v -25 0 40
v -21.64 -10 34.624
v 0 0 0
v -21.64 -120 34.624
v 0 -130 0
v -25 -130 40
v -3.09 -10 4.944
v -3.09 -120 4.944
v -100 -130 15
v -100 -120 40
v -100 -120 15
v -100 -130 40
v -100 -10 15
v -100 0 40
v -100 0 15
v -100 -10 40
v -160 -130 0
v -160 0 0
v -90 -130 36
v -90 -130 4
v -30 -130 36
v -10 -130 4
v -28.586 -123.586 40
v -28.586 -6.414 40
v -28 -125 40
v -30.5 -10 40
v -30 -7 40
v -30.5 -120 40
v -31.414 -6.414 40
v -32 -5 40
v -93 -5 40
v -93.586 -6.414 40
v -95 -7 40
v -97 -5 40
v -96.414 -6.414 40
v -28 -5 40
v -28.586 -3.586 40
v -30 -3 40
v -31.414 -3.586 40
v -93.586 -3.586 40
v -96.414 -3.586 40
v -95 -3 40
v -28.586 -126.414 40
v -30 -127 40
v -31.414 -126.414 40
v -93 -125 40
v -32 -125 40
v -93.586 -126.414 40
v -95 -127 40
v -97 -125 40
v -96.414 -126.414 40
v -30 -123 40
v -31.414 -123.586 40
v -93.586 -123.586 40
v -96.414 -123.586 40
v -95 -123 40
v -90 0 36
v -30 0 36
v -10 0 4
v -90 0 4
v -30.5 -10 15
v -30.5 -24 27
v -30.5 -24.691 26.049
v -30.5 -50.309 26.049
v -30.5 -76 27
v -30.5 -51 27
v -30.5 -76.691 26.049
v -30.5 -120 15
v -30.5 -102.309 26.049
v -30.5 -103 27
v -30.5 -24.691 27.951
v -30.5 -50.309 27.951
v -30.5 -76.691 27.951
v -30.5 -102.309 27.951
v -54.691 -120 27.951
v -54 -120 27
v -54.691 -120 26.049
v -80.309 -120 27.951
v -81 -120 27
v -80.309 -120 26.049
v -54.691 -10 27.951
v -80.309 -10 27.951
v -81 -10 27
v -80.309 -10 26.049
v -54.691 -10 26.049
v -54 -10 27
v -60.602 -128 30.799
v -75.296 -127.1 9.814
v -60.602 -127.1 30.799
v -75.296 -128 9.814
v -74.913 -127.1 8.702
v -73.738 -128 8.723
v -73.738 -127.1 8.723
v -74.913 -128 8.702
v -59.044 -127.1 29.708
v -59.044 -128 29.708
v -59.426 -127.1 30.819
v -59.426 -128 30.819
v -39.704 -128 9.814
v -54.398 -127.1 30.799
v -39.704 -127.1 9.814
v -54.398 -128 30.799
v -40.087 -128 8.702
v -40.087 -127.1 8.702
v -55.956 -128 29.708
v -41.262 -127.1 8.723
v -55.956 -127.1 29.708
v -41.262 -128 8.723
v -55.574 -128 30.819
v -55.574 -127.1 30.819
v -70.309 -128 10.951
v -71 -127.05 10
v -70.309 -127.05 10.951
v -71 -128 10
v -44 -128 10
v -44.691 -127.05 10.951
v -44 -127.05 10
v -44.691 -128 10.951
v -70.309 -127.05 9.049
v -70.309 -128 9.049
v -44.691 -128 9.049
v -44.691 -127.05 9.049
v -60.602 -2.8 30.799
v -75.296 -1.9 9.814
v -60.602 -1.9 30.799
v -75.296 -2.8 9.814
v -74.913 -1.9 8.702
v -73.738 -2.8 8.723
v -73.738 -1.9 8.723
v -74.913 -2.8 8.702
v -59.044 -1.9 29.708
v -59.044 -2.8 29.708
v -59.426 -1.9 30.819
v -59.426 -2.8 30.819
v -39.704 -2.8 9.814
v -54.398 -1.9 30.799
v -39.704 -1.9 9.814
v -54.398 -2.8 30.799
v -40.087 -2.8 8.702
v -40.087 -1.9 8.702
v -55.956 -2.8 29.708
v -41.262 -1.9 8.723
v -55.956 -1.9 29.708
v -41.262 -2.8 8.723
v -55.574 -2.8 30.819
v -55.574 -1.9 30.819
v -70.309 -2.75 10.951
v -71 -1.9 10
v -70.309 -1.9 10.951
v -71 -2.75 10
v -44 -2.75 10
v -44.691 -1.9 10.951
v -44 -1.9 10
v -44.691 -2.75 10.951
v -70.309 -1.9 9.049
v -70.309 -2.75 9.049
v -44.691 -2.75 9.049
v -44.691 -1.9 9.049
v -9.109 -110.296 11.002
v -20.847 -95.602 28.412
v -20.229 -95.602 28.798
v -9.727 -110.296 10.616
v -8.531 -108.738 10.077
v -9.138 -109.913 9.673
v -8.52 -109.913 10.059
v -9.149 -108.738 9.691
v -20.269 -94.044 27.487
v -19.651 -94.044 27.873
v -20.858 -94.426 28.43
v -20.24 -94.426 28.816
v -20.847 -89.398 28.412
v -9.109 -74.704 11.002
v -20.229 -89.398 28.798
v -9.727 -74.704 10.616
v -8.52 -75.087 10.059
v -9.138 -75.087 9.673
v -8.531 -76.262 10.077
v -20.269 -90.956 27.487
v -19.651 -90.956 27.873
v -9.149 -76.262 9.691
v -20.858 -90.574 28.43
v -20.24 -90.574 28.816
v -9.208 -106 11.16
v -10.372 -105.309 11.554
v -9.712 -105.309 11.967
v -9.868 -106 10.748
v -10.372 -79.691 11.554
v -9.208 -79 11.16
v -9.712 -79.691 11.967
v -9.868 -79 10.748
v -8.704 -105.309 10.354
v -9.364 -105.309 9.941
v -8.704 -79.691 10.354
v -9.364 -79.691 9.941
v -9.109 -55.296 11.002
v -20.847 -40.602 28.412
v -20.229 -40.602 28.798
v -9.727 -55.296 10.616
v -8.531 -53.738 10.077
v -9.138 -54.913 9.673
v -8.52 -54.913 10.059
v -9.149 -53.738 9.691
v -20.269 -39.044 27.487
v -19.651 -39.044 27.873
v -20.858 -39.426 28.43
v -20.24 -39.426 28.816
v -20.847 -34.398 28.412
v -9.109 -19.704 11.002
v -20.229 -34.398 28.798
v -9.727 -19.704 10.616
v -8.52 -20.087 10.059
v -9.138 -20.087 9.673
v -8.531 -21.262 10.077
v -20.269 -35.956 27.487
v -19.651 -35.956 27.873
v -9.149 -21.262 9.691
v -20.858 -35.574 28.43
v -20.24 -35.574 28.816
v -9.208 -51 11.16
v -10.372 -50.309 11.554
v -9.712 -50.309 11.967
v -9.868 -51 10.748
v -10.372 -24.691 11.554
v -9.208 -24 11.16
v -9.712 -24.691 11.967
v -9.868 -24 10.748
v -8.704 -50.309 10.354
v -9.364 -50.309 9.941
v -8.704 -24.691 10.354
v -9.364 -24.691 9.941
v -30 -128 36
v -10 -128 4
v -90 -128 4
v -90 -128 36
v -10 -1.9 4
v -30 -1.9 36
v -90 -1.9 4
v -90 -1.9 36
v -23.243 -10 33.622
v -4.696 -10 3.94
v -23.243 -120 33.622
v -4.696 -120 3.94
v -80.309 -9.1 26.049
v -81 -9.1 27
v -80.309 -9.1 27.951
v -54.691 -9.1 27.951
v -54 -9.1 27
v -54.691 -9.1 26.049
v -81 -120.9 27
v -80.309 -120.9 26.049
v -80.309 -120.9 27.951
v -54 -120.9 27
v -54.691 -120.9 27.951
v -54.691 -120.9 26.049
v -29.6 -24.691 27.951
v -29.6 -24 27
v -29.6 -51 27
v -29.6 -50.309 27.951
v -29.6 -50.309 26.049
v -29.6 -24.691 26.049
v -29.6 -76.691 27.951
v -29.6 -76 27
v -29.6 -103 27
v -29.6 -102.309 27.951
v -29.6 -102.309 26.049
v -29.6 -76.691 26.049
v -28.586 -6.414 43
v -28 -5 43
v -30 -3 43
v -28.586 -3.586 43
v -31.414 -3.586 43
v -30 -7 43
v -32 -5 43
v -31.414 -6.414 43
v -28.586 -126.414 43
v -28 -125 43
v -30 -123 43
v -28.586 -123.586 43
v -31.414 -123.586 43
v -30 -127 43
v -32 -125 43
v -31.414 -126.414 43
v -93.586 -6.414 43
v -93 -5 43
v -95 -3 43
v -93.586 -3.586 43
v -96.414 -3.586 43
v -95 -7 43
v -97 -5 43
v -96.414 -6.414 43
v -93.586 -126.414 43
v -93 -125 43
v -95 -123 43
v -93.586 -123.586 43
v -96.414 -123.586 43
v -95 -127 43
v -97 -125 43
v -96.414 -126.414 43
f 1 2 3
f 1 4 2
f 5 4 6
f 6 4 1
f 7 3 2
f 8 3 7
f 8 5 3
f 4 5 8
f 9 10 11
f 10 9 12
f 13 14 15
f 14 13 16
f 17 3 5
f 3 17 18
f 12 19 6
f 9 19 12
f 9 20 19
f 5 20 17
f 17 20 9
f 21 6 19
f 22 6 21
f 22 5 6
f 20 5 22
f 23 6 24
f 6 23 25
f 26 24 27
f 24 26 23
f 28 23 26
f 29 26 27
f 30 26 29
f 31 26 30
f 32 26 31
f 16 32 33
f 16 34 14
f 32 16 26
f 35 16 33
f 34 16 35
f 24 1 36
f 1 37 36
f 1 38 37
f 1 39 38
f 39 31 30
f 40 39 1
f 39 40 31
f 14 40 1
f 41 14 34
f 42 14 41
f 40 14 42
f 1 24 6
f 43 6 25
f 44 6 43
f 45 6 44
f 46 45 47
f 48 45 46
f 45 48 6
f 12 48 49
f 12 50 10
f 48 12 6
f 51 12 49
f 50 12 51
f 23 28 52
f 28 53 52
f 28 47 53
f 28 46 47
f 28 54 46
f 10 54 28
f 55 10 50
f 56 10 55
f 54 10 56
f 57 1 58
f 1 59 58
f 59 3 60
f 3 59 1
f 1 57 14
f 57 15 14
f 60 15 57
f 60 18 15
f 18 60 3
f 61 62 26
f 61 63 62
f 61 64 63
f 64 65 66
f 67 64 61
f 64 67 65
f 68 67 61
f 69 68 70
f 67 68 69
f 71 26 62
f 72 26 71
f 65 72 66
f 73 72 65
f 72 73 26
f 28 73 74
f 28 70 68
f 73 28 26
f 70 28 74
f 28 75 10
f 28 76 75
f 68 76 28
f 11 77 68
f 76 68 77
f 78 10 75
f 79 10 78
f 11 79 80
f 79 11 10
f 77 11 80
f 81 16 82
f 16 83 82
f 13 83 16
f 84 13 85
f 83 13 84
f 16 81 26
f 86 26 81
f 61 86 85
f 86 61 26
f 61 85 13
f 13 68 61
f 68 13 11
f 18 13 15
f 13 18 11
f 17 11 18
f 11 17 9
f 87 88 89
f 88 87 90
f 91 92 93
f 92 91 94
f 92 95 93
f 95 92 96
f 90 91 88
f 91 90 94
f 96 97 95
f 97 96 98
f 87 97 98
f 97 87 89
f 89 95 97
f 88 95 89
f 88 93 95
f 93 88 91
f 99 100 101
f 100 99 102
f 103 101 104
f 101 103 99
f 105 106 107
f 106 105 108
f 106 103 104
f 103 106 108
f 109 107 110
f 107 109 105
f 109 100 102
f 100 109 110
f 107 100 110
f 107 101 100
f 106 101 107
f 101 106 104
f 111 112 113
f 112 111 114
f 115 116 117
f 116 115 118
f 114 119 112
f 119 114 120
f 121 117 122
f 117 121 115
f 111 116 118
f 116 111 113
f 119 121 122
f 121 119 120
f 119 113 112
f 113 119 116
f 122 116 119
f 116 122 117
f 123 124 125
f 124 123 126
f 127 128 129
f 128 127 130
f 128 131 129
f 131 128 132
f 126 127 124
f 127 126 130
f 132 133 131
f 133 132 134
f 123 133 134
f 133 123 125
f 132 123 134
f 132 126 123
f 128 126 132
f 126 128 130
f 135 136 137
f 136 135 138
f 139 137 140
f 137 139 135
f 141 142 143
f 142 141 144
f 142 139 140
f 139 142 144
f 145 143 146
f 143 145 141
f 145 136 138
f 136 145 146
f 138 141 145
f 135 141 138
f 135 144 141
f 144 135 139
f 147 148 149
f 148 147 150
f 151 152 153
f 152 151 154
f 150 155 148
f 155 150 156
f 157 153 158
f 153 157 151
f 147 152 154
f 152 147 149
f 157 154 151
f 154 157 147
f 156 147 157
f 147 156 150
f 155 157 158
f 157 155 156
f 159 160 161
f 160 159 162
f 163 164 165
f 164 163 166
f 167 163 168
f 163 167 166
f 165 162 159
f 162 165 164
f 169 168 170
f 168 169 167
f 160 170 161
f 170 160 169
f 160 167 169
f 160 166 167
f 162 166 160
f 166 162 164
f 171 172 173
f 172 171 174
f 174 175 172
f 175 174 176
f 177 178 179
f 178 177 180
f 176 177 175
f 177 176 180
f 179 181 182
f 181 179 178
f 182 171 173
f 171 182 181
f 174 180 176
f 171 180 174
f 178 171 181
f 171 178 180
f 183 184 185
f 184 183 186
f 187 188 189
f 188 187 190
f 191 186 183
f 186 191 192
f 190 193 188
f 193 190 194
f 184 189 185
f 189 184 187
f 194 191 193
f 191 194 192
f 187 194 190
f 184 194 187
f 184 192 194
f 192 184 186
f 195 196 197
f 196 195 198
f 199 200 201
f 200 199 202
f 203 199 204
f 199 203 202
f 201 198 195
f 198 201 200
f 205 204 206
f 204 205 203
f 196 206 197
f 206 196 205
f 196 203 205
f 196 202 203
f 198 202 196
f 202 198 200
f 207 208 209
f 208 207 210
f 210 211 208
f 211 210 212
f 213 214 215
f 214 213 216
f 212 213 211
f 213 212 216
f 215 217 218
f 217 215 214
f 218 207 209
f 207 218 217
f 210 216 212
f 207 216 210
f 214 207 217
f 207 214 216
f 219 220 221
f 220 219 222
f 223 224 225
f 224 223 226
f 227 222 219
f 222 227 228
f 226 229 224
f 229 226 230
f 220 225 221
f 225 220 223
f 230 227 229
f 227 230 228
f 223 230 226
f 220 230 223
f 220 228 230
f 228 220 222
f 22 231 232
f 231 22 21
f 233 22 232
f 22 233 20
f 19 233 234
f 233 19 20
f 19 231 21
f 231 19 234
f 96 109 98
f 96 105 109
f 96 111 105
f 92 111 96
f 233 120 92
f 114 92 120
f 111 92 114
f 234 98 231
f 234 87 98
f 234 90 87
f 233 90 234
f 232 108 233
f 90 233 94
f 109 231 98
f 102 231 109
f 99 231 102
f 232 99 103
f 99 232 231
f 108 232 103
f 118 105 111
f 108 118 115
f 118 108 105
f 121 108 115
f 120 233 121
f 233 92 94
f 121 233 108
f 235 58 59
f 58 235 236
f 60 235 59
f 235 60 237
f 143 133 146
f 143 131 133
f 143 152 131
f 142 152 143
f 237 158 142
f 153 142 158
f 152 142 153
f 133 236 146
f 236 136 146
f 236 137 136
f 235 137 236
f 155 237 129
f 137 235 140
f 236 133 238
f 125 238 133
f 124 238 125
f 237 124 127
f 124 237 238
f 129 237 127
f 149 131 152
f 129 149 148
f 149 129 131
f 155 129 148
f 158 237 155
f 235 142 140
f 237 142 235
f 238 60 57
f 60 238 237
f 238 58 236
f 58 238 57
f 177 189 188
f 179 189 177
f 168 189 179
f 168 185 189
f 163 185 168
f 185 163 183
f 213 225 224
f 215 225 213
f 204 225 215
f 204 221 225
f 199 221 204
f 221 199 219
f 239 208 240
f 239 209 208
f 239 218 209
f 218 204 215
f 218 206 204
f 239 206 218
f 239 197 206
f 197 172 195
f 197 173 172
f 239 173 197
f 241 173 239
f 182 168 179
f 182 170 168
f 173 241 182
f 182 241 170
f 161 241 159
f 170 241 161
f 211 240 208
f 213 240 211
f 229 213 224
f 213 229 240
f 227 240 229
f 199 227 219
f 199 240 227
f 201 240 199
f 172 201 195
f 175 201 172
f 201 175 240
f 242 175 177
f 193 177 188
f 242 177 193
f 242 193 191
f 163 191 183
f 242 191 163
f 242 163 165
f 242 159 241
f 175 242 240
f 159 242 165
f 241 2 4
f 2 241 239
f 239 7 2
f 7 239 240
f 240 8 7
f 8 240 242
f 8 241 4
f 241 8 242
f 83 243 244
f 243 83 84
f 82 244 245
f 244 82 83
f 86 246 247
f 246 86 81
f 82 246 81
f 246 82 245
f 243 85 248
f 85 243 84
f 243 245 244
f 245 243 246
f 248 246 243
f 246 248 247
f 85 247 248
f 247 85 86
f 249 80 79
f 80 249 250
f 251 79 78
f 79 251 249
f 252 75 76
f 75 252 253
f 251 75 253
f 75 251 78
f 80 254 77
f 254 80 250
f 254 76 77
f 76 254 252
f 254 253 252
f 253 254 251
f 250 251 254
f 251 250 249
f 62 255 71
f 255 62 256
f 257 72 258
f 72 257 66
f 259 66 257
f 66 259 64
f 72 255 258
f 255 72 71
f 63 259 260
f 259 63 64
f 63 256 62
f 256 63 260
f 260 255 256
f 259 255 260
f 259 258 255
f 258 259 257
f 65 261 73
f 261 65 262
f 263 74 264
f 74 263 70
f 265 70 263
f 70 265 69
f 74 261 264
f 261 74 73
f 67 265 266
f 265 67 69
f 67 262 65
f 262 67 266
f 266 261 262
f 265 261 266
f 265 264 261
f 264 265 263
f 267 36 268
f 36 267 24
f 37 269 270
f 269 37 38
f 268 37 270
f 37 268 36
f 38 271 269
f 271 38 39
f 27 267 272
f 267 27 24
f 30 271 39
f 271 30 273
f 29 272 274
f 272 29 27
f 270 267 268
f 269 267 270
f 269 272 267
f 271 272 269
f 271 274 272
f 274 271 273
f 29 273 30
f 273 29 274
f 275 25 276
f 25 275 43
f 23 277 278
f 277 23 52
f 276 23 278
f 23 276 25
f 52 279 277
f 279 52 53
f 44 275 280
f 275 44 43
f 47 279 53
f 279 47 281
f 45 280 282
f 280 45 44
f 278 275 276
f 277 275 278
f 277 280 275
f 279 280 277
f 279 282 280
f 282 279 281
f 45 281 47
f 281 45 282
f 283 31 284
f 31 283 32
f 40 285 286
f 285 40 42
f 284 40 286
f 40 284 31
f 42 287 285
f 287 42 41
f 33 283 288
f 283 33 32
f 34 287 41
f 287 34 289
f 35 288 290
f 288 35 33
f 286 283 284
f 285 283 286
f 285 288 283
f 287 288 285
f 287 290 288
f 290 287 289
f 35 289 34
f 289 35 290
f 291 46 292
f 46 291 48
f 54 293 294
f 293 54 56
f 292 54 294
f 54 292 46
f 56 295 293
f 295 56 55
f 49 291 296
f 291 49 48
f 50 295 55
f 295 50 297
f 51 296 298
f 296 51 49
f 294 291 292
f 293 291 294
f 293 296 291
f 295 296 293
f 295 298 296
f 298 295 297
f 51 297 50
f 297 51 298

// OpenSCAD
difference() {
    translate([-100,0,0])
    union() {
        rotate([90,0,0])
        difference () {
            sidePanel(130);

            translate ([-0.5,15,10])
            cube([70,40,110]);

        }   

        translate([0,-130,15])
        rotate([-90,0,90])
        color([1,0,0])
        prism(130,15,60);
    }

    // Begin left Side Panel
    translate([-90,-128,4])
    rotate([90,0,0])
    sidePanel(3,[0.8,0.8,0.8]);

    translate([-55,-127.6,30])
    rotate([0,90,90])
    color([0,1,1])
    arcTriangle();
    // End left Side Panel
    
    // Begin right side panel
    translate([-90,0.5,4])
    rotate([90,0,0])
    sidePanel(3,[0.8,0.8,0.8]);

    translate([-55,-2.3,30])
    rotate([0,90,90])
    color([0,1,1])
    arcTriangle();
    // End right side panel

    // Begin front panel
    translate([-3,-120,5])
    rotate([0,-122,0])
    cube([35,110,2]);
    
    translate([-20,-90,28])
    rotate([0,122,180])
    color([0,1,1])
    arcTriangle();
    
    translate([-20,-35,28])
    rotate([0,122,180])
    color([0,1,1])
    arcTriangle();
    // End front panel
    
    // Begin inside panels
    translate([-80,-9.6,27])
    rotate([90,0,0])
    color([0,1,1])
    arcOval();
    
    translate([-80,-120.4,27])
    rotate([90,0,0])
    color([0,1,1])
    arcOval();
    
    translate([-30.1,-50,27])
    rotate([90,0,90])
    color([0,1,1])
    arcOval();
    
    translate([-30.1,-102,27])
    rotate([90,0,90])
    color([0,1,1])
    arcOval();
    // End inside panels
}   


// Front pins
translate([-30,-5,40])
color([1,0,0])
cylinder(h=6,r=2, center=true, $fn=8);

translate([-30,-125,40])
color([1,0,0])
cylinder(h=6,r=2, center=true, $fn=8);

// rear pins
translate([-95,-5,40])
color([1,0,0])
cylinder(h=6,r=2, center=true, $fn=8);

translate([-95,-125,40])
color([1,0,0])
cylinder(h=6,r=2, center=true, $fn=8);



module sidePanel(h,s=[1,1,1]) {
    scale(s)
    linear_extrude(height=h){
            polygon(points = [[0,0],[100,0],[75,40],[0,40]]);
    }
}

module arcTriangle() {
    union() {
        translate([0,5,0])
        rotate([0,0,35])
        arcOval();
        rotate([180,0,-35])
        arcOval();
        translate([20,-10,0.05])
        rotate([0,0,90])
        arcOval();
    }
}

module prism(l, w, h){
       polyhedron(
               points=[[0,0,0], [l,0,0], [l,w,0], [0,w,0], [0,w,h], [l,w,h]],
               faces=[[0,1,2,3],[5,4,3,2],[0,4,5,1],[0,3,4],[5,2,1]]
               );
}

module arcOval() {
   hull() {
    rotate([0,180,0])
    cylinder(h=1,r=1, center=true);
    translate([25,0,0])
    cylinder(h=1,r=1, center=true);
    }
}
